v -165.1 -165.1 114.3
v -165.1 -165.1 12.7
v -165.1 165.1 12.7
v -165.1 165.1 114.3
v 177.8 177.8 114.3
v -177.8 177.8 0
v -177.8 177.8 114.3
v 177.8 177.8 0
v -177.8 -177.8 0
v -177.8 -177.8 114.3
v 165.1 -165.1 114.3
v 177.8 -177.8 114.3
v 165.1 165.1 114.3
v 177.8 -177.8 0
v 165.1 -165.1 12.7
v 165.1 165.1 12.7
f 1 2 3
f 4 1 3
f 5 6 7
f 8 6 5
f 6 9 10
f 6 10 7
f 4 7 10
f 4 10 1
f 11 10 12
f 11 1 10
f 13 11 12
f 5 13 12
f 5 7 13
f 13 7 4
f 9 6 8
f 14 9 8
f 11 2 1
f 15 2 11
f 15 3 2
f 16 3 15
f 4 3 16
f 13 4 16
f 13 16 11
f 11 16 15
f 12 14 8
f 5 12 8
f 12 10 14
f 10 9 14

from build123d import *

# Parameters (mm, degrees)
F0_W     = 355.6
F0_H     = 355.6
F1_DEPTH = 12.7
F2_W     = 355.6
F2_H     = 12.7
F4_DEPTH = 101.6
F5_W     = 330.2
F5_H     = 12.7
F6_DEPTH = 101.6


with BuildPart() as f1:
    # F0 (on Top) → F1 (new body)
    with BuildSketch(Plane.XY):
        Rectangle(F0_W, F0_H)
    extrude(amount=F1_DEPTH)

    # F2 (on face) + F3 (on face) → F4 (join)
    with BuildSketch(Plane.XY.offset(12.7)):
        with Locations((0, 171.45)):
            Rectangle(F2_W, F2_H)
    with BuildSketch(Plane.XY.offset(12.7)):
        Polygon((-165.1, -177.8), (-165.1, 177.8), (-177.8, 177.8), (-177.8, -165.1), (-177.8, -177.8), align=None)
        Polygon((177.8, -177.8), (177.8, 165.1), (165.1, 165.1), (165.1, -165.1), (165.1, -177.8), align=None)
    extrude(amount=F4_DEPTH)

    # F5 (on face) → F6 (join)
    with BuildSketch(Plane.XY.offset(12.7)):
        with Locations((0, -171.45)):
            Rectangle(F5_W, F5_H)
    extrude(amount=F6_DEPTH)


solid = f1.part
